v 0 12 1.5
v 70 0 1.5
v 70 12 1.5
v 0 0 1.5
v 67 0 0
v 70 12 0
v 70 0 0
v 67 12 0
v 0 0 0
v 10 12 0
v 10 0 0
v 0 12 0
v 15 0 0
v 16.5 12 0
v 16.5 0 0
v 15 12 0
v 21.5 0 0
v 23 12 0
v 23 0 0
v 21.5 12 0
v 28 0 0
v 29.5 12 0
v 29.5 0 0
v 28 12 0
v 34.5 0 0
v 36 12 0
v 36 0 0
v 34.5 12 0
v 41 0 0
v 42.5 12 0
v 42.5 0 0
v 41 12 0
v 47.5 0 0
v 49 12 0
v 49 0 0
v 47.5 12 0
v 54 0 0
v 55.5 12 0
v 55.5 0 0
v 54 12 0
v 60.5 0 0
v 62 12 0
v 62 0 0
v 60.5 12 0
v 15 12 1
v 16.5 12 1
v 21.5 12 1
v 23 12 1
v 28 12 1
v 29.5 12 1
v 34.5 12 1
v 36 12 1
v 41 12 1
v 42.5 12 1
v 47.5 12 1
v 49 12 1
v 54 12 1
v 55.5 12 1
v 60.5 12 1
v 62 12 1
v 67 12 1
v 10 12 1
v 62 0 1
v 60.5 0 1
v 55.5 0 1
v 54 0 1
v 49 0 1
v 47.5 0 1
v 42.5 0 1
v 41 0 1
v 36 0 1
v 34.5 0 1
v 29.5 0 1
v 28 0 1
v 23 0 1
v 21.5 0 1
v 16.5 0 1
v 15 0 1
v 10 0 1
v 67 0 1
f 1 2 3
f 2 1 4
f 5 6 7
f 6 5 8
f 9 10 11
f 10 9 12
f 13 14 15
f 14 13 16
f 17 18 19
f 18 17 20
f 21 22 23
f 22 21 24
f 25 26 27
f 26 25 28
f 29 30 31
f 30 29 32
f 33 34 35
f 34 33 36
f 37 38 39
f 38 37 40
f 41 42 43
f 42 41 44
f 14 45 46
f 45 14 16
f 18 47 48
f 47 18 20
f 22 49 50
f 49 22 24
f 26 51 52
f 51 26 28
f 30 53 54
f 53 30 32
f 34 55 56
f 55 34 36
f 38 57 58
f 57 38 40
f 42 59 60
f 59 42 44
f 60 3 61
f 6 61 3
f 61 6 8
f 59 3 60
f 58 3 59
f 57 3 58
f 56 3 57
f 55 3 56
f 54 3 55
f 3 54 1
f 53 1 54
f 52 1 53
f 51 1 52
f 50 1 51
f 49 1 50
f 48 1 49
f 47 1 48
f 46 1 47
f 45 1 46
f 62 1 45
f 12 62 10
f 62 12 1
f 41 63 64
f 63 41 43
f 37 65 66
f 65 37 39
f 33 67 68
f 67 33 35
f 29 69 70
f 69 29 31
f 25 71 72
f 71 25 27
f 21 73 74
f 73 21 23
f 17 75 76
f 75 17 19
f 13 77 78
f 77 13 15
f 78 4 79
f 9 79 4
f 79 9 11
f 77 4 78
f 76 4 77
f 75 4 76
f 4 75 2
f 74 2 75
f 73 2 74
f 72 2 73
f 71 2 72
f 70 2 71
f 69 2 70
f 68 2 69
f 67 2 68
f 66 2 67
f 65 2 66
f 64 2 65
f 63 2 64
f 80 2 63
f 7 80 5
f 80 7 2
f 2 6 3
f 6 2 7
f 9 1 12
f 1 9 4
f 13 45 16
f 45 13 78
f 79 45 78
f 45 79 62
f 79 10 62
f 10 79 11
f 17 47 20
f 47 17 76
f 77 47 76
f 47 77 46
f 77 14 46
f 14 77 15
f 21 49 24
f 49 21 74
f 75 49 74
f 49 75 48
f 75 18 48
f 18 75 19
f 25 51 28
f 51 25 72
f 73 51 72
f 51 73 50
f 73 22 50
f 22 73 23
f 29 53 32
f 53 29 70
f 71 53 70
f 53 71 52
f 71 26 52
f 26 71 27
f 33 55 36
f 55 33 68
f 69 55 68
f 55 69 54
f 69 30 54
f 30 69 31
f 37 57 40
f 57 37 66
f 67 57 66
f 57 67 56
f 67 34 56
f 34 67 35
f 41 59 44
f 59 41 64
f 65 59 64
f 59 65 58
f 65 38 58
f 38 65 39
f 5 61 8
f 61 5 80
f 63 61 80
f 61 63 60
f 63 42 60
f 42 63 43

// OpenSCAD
// Agarose gel comb - a flat plate with a back bar and a row of rectangular teeth for casting
// horizontal gels. NOVEL general part, printed lying flat on the bed.
//

teeth = 10;
bar_l = 70;
bar_w = 12;
t     = 1.5;
tooth_w = 5.0;
tooth_h = 12;
gap   = 1.5;

$fn = 48;

teeth_p = tooth_w + gap;
span    = teeth * teeth_p;
center  = (bar_l - span) / 2 + tooth_w / 2;

difference() {
    union() {
        translate([0, 0, 0]) cube([bar_l, bar_w, t]);                 // back bar
        for (i = [0 : teeth - 1])
            translate([center + i * teeth_p, 0, 0]) cube([tooth_w, tooth_h, t]);   // teeth
    }
    for (i = [0 : teeth - 2])
        translate([center + (i + 1) * teeth_p - gap, 0, -1]) cube([tooth_w, tooth_h, 2]);  // gaps
}
